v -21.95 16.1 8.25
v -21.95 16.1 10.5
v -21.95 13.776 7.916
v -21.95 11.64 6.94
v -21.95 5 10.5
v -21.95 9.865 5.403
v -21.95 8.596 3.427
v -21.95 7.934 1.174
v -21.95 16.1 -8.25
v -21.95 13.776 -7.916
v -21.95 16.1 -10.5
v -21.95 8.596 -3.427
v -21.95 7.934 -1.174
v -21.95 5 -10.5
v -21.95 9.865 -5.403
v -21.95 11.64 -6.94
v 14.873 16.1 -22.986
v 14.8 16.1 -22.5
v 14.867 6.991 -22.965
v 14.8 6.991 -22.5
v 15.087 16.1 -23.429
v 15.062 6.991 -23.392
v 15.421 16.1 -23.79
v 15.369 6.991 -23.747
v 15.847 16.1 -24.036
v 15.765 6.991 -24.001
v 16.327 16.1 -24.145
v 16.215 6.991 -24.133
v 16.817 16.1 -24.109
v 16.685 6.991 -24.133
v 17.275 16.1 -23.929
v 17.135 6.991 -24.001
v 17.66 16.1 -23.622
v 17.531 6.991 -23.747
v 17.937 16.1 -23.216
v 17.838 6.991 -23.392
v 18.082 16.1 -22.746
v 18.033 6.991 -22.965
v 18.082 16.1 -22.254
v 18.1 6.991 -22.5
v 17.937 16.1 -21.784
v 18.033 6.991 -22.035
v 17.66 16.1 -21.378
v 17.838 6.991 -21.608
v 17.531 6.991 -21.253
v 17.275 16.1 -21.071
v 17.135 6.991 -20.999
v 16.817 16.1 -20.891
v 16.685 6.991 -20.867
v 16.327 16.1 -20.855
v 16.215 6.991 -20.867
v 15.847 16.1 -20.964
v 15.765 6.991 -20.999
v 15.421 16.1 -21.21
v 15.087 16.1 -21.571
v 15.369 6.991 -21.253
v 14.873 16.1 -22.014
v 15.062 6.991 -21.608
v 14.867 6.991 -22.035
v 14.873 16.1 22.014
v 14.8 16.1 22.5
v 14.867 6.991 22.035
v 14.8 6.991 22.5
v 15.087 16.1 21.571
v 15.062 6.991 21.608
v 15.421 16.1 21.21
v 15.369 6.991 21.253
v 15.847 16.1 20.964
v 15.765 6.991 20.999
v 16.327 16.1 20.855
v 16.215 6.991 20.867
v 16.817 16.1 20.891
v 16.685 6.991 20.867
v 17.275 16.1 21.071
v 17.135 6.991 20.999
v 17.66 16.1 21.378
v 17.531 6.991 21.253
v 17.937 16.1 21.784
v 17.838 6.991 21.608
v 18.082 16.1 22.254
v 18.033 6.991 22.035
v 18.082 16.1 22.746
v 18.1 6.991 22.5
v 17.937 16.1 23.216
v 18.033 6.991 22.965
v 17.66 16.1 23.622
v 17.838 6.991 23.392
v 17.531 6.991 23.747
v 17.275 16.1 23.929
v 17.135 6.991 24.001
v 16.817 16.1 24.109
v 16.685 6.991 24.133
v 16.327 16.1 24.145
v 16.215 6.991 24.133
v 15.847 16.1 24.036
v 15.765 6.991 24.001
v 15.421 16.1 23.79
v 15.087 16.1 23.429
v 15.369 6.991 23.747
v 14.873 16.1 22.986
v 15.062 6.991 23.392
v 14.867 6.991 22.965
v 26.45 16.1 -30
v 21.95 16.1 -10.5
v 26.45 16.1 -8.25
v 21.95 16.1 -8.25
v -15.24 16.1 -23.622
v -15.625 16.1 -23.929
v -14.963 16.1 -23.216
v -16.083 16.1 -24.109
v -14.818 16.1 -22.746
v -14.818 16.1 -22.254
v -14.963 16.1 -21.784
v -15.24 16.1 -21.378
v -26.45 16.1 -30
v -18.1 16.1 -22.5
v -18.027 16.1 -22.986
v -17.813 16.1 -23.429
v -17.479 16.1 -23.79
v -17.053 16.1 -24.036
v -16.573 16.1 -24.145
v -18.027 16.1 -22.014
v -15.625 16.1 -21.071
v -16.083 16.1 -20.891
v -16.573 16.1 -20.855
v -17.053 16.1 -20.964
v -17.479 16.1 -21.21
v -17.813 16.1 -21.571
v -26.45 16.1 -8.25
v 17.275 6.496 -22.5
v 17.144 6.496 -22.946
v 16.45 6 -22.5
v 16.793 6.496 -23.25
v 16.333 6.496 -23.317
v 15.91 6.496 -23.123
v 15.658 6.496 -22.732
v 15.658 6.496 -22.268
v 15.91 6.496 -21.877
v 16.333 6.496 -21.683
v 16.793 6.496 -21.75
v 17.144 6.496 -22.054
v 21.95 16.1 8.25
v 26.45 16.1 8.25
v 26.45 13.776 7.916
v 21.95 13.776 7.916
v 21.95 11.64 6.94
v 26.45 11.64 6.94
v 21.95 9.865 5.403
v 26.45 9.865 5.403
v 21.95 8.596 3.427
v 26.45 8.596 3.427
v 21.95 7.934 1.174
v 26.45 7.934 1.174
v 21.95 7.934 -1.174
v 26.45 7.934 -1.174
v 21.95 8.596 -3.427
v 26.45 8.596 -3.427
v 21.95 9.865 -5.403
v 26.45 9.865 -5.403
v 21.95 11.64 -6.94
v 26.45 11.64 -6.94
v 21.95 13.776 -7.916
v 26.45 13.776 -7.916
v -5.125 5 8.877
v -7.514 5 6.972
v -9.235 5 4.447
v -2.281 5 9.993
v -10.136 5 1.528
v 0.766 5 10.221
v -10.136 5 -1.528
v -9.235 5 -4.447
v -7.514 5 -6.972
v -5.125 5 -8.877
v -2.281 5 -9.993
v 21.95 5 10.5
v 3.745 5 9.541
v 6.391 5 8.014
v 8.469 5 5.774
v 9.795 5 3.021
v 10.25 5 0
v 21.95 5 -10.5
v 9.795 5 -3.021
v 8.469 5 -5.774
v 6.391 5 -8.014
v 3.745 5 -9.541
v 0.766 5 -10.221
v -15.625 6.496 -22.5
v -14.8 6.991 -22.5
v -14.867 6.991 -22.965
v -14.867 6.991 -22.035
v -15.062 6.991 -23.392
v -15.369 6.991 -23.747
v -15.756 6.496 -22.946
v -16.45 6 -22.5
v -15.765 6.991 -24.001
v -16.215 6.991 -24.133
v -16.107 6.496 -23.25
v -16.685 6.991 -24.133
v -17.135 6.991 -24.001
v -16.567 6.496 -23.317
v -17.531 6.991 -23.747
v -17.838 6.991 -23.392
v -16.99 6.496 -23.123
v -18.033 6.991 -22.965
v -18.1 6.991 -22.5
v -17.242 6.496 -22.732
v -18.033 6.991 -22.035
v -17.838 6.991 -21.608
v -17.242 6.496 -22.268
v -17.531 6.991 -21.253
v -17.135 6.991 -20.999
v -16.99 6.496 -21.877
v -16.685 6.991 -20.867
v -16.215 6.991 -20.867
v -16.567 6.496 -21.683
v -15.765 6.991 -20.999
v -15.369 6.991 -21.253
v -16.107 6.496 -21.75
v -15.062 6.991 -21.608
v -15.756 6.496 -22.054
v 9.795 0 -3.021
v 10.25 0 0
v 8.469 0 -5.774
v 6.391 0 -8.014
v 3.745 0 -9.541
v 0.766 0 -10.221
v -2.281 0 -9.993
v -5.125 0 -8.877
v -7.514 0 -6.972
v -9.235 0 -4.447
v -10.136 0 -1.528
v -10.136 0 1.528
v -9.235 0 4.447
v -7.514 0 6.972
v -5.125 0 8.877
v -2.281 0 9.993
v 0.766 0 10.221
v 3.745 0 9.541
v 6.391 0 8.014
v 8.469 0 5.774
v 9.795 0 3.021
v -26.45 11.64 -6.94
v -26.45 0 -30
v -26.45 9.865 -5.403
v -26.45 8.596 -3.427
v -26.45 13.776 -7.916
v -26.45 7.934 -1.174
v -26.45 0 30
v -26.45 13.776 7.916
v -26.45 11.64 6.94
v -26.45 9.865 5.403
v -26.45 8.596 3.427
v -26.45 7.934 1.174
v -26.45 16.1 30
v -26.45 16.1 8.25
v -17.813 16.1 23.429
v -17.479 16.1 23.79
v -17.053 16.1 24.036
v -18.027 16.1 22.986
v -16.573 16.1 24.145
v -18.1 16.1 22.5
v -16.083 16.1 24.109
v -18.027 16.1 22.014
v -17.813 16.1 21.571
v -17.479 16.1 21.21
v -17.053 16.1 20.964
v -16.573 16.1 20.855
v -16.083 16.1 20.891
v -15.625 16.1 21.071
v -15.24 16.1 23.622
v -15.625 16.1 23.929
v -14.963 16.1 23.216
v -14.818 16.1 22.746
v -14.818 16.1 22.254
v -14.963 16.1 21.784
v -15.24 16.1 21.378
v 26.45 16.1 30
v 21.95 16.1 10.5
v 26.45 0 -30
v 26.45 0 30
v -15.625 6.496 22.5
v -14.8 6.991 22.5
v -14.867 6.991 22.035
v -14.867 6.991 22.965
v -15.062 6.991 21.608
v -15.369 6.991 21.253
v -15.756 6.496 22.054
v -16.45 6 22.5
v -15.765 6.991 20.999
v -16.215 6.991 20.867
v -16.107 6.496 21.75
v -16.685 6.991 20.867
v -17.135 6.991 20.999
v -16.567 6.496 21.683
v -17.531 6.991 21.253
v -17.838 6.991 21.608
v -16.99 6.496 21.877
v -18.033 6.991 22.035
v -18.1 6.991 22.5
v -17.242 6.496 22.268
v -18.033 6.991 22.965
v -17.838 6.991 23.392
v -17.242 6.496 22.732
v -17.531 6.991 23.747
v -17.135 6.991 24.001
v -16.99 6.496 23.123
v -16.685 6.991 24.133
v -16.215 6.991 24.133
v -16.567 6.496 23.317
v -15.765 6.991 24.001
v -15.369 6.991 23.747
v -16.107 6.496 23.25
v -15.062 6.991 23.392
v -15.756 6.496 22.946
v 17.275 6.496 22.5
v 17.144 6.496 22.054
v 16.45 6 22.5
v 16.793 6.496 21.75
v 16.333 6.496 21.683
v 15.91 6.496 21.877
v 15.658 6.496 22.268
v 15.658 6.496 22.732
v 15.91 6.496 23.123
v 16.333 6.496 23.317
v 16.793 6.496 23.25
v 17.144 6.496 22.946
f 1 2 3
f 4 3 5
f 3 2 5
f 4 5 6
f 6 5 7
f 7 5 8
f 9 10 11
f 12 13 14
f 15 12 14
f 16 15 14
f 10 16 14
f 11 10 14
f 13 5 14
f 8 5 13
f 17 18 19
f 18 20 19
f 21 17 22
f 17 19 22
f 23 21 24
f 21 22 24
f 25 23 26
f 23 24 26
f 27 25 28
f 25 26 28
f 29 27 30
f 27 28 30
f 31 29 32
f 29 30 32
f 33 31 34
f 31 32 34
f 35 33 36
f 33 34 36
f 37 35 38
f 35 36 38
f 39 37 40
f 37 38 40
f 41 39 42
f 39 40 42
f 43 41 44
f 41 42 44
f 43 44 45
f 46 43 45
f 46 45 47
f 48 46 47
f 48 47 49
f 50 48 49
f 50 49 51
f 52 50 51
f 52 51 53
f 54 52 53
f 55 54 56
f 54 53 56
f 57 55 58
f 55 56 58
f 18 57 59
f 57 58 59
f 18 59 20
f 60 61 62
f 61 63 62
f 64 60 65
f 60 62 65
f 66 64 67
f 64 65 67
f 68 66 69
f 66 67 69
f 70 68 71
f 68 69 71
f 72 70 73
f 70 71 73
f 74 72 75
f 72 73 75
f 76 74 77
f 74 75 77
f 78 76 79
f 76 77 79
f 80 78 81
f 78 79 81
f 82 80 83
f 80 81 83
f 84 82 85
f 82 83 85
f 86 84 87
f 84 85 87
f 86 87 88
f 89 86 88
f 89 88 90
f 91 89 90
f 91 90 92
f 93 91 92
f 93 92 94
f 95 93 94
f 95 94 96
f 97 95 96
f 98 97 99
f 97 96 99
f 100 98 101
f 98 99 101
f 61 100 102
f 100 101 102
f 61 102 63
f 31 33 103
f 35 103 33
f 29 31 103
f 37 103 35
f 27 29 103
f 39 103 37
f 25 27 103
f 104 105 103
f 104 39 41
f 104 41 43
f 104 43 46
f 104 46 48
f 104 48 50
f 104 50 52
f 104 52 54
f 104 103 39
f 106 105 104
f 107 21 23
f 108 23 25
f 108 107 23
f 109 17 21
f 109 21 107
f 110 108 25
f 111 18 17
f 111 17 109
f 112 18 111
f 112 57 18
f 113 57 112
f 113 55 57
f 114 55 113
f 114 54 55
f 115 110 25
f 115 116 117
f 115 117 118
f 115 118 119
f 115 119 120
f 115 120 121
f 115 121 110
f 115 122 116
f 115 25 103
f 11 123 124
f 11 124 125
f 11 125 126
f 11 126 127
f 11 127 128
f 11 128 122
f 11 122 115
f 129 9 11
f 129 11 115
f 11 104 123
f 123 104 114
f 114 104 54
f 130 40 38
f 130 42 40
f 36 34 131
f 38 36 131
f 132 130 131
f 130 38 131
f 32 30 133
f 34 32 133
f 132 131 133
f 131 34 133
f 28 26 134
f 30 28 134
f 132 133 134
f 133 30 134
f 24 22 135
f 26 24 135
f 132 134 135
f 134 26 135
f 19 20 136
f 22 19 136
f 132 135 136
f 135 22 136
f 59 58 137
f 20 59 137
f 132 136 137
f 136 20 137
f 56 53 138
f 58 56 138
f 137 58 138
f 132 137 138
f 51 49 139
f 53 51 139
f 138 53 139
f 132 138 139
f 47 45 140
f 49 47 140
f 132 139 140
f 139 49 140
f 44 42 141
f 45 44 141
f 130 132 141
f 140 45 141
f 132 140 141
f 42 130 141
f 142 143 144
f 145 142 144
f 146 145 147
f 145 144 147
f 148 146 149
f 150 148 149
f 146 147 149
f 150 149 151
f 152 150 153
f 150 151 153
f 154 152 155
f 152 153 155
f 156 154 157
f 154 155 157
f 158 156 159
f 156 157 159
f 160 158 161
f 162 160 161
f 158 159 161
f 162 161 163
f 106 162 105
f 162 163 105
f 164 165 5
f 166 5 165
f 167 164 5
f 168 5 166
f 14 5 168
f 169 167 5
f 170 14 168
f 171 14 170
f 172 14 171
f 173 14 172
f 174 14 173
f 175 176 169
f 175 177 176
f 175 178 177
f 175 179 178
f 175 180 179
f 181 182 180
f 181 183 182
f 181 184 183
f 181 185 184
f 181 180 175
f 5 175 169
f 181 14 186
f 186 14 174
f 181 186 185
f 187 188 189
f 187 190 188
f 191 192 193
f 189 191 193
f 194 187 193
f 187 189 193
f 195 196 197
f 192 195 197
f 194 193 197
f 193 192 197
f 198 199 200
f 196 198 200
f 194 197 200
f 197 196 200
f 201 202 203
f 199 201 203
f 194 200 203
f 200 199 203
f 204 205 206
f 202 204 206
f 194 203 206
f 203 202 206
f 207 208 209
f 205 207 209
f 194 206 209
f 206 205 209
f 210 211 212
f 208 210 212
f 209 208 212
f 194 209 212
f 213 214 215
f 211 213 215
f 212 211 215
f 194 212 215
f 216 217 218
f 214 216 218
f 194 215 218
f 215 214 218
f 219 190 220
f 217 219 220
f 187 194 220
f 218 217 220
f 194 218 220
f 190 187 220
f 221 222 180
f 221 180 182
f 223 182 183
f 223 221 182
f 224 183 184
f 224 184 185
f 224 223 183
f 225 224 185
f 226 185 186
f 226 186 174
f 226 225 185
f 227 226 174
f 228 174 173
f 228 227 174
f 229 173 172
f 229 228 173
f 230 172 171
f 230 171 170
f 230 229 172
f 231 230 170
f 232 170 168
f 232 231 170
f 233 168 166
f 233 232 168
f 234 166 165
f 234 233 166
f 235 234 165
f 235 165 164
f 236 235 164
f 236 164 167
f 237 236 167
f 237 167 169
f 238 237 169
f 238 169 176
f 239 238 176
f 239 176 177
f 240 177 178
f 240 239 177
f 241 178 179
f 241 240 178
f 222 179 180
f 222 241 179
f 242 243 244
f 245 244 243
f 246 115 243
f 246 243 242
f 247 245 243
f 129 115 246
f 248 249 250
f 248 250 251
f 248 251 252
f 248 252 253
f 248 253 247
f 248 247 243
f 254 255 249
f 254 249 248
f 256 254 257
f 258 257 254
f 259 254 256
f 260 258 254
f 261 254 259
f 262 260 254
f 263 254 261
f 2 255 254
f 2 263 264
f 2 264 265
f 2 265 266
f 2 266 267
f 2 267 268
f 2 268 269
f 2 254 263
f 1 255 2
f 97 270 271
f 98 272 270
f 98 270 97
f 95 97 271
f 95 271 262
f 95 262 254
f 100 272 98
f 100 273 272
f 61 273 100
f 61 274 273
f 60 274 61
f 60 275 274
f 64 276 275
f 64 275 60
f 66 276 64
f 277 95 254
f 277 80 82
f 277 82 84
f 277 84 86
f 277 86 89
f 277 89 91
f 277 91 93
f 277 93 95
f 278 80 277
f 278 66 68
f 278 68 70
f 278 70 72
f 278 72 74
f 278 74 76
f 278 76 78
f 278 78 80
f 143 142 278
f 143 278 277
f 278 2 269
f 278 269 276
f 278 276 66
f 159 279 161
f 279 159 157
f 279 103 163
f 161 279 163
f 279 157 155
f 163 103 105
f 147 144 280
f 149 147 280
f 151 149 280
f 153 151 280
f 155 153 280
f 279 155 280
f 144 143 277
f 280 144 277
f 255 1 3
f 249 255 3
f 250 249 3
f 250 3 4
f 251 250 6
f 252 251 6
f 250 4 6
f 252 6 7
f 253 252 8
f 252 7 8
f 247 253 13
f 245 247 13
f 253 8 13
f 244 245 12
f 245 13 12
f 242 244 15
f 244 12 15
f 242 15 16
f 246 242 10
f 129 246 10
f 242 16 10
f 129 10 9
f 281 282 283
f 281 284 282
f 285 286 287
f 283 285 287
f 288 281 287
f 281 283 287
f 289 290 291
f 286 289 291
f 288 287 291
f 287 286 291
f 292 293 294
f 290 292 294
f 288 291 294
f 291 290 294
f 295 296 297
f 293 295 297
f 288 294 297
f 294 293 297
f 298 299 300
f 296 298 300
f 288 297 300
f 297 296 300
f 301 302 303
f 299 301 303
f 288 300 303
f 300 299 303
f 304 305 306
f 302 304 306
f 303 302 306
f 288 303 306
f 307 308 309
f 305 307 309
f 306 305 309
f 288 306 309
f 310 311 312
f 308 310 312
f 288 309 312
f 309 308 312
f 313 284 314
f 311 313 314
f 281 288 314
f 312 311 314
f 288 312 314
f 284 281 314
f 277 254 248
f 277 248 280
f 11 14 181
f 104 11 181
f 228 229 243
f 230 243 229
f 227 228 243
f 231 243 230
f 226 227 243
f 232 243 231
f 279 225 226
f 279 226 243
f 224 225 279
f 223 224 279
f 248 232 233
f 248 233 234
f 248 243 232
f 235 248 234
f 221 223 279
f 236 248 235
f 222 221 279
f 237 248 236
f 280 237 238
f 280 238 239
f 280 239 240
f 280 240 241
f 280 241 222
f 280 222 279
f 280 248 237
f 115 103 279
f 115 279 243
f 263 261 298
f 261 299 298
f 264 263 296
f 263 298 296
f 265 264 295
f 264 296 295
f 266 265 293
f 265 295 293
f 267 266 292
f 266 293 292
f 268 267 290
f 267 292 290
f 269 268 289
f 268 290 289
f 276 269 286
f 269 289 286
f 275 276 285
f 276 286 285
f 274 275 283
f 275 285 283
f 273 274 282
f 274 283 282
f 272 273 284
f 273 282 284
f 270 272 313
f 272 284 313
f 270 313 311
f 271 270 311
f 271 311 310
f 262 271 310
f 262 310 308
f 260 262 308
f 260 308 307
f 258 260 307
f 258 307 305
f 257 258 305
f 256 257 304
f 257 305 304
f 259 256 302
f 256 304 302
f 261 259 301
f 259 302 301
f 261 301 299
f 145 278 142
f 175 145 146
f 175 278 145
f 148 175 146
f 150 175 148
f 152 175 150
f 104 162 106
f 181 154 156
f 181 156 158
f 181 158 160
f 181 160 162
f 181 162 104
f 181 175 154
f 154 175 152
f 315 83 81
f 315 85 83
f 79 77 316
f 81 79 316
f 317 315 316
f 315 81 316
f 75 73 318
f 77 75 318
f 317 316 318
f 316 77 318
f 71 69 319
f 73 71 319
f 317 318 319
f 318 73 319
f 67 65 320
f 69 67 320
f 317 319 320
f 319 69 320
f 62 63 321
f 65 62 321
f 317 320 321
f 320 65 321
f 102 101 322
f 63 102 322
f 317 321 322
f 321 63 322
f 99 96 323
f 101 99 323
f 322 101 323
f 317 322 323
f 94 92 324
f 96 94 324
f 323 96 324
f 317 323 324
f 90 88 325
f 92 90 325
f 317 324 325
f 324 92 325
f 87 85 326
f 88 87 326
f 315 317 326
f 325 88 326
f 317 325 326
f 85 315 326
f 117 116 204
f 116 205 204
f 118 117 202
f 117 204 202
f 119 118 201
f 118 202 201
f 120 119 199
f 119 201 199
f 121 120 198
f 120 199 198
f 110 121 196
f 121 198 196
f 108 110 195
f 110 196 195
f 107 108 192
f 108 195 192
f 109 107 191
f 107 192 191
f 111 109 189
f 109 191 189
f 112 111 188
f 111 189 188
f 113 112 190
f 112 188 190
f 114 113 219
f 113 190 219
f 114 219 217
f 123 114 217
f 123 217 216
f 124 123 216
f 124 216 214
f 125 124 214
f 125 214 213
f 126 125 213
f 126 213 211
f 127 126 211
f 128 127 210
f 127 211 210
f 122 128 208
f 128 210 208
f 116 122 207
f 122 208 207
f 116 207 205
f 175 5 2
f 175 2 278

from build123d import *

# Parameters (mm, degrees)
SKETCH1_W             = 52.9
SKETCH1_H             = 30
SKETCH1_R             = 10.25
BOSS_EXTRUDE1_DEPTH   = 5
SKETCH3_W             = 52.9
SKETCH3_H             = 30
SKETCH3_W_2           = 43.9
SKETCH3_H_2           = 21
BOSS_EXTRUDE2_DEPTH   = 11.1
SKETCH4_R             = 8.25
CUT_EXTRUDE1_DEPTH    = 53.9
SKETCH5_W             = 52.9
SKETCH5_H             = 5
BOSS_EXTRUDE3_DEPTH   = 15
SKETCH6_W             = 52.9
SKETCH6_H             = 5
BOSS_EXTRUDE4_DEPTH   = 15
SKETCH7_W             = 52.9
SKETCH7_H             = 15
BOSS_EXTRUDE5_DEPTH   = 11.1
M4_TAPPED_HOLE1_D     = 3.3
M4_TAPPED_HOLE1_DEPTH = 9.108579979
M4_TAPPED_HOLE1_TIP   = 0.991420021


with BuildPart() as part:
    # Sketch1 → Boss-Extrude1 (new body)
    with BuildSketch(Plane(origin=(0, 0, 0), x_dir=(1, 0, 0), z_dir=(0, 1, 0))):
        Rectangle(SKETCH1_W, SKETCH1_H)
        Circle(SKETCH1_R, mode=Mode.SUBTRACT)
    extrude(amount=BOSS_EXTRUDE1_DEPTH)

    # Sketch3 → Boss-Extrude2 (add)
    with BuildSketch(Plane(origin=(0, 5, 0), x_dir=(1, 0, 0), z_dir=(0, 1, 0))):
        Rectangle(SKETCH3_W, SKETCH3_H)
        Rectangle(SKETCH3_W_2, SKETCH3_H_2, mode=Mode.SUBTRACT)
    extrude(amount=BOSS_EXTRUDE2_DEPTH)

    # Sketch4 → Cut-Extrude1 (cut, through all)
    with BuildSketch(Plane(origin=(26.45, 0, 0), x_dir=(0, 0, -1), z_dir=(1, 0, 0))):
        with Locations((0, 16.1)):
            Circle(SKETCH4_R)
    extrude(amount=-CUT_EXTRUDE1_DEPTH, mode=Mode.SUBTRACT)

    # Sketch5 → Boss-Extrude3 (add)
    with BuildSketch(Plane.XY.offset(15)):
        with Locations((0, 13.6)):
            Rectangle(SKETCH5_W, SKETCH5_H)
    extrude(amount=BOSS_EXTRUDE3_DEPTH)

    # Sketch6 → Boss-Extrude4 (add)
    with BuildSketch(Plane(origin=(0, 0, -15), x_dir=(-1, 0, 0), z_dir=(0, 0, -1))):
        with Locations((0, 13.6)):
            Rectangle(SKETCH6_W, SKETCH6_H)
    extrude(amount=BOSS_EXTRUDE4_DEPTH)

    # Sketch7 → Boss-Extrude5 (add)
    with BuildSketch(Plane.XZ.offset(-11.1)):
        with Locations((0, 22.5)):
            Rectangle(SKETCH7_W, SKETCH7_H)
        with Locations((0, -22.5)):
            Rectangle(SKETCH7_W, SKETCH7_H)
    extrude(amount=BOSS_EXTRUDE5_DEPTH)

    # M4 Tapped Hole1
    with Locations(Plane(origin=(0, 16.1, 0), x_dir=(1, 0, 0), z_dir=(0, 1, 0))):
        with Locations((-16.45, -22.5), (16.45, -22.5), (16.45, 22.5), (-16.45, 22.5)):
            Hole(M4_TAPPED_HOLE1_D / 2, depth=M4_TAPPED_HOLE1_DEPTH)
            with Locations((0, 0, -(M4_TAPPED_HOLE1_DEPTH + M4_TAPPED_HOLE1_TIP / 2))):  # 118° drill point
                Cone(0, M4_TAPPED_HOLE1_D / 2, M4_TAPPED_HOLE1_TIP, mode=Mode.SUBTRACT)


solid = part.part
